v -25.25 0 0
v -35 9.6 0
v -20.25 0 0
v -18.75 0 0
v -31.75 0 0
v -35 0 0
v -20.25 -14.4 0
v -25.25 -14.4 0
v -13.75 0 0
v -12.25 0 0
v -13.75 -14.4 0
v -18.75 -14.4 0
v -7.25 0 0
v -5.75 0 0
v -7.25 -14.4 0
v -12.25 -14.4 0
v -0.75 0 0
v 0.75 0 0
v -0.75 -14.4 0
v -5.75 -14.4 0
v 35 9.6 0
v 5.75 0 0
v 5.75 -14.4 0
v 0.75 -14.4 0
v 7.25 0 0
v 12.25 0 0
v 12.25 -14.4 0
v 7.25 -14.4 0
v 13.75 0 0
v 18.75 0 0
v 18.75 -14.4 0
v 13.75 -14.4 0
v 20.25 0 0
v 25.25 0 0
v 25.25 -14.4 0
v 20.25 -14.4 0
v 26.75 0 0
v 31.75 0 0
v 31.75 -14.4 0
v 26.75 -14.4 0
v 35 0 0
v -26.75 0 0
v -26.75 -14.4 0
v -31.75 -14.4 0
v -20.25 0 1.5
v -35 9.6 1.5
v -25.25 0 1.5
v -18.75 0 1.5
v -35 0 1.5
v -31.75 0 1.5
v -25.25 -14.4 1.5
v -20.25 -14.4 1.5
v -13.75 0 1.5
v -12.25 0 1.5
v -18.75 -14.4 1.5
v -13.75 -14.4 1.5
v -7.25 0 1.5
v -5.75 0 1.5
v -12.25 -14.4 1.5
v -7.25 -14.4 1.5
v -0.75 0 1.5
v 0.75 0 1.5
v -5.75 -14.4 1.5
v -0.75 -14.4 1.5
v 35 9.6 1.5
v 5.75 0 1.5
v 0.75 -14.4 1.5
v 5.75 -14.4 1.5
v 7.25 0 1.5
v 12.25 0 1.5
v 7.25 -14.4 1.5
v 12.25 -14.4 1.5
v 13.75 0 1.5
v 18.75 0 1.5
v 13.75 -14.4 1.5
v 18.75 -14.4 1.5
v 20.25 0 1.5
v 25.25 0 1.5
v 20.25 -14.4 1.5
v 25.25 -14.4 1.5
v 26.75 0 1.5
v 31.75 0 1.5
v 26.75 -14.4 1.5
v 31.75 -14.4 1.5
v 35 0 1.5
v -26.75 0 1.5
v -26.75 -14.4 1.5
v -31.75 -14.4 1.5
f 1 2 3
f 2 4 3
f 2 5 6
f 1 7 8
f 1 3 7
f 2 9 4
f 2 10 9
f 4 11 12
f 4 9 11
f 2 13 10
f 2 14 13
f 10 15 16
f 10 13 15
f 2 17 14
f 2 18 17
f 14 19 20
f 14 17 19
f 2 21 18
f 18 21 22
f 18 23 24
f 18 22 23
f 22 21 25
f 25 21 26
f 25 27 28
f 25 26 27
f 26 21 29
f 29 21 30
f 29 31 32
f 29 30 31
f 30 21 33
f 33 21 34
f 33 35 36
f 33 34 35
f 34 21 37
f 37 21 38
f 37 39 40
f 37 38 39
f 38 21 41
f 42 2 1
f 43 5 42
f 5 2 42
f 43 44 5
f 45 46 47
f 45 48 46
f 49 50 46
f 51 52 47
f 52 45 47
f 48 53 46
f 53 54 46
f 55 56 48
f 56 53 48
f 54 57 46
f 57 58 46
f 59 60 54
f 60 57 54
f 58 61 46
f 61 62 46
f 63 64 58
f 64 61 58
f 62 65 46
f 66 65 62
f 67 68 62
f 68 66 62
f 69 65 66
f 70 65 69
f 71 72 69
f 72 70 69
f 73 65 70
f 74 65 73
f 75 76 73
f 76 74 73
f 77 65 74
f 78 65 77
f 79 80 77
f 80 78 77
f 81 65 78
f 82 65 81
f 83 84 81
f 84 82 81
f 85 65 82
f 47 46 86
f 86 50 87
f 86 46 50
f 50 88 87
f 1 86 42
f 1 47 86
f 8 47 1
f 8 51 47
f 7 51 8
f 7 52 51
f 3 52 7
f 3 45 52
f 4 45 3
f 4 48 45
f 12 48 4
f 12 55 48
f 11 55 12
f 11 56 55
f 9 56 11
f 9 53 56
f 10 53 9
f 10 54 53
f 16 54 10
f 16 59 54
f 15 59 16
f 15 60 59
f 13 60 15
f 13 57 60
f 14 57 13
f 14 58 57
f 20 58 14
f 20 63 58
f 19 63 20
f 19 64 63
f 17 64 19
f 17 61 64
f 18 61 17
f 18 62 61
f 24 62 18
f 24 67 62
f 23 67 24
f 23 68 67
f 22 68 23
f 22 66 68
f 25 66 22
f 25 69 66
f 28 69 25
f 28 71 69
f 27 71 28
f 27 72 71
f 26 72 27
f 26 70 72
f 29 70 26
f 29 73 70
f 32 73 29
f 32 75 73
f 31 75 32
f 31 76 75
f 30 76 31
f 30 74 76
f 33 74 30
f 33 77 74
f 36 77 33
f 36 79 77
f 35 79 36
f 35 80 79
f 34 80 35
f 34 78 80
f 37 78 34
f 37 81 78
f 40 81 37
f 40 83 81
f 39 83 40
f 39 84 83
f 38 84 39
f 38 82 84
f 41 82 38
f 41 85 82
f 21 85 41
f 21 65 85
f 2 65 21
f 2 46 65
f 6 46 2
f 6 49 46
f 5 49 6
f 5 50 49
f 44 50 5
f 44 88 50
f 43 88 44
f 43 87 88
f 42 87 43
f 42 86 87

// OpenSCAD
// 10-well comb for casting agarose gels
// Category: tools. Flat part, prints lying down; the bottom (bed) side is smoothest.
// Print: PETG (survives hot agarose better than PLA), 0.15 mm layers, 100 % infill.
// SPDX-License-Identifier: CERN-OHL-P-2.0

/* [Comb] */
spine = [70, 9.6];      // back bar, X x Y [mm]
n_teeth = 10;
tooth_w = 5.0;         // well width
tooth_len = 14.4;        // well depth into the gel
gap = 1.5;             // gel between wells
thickness = 1.5;       // well thickness (comb printed flat)

/* [Hidden] */
eps = 0.01;
span = n_teeth * tooth_w + (n_teeth - 1) * gap;

linear_extrude(thickness) {
    translate([-spine.x / 2, 0]) square(spine);
    for (i = [0 : n_teeth - 1])
        translate([-span / 2 + i * (tooth_w + gap), -tooth_len])
            square([tooth_w, tooth_len + eps]);
}
